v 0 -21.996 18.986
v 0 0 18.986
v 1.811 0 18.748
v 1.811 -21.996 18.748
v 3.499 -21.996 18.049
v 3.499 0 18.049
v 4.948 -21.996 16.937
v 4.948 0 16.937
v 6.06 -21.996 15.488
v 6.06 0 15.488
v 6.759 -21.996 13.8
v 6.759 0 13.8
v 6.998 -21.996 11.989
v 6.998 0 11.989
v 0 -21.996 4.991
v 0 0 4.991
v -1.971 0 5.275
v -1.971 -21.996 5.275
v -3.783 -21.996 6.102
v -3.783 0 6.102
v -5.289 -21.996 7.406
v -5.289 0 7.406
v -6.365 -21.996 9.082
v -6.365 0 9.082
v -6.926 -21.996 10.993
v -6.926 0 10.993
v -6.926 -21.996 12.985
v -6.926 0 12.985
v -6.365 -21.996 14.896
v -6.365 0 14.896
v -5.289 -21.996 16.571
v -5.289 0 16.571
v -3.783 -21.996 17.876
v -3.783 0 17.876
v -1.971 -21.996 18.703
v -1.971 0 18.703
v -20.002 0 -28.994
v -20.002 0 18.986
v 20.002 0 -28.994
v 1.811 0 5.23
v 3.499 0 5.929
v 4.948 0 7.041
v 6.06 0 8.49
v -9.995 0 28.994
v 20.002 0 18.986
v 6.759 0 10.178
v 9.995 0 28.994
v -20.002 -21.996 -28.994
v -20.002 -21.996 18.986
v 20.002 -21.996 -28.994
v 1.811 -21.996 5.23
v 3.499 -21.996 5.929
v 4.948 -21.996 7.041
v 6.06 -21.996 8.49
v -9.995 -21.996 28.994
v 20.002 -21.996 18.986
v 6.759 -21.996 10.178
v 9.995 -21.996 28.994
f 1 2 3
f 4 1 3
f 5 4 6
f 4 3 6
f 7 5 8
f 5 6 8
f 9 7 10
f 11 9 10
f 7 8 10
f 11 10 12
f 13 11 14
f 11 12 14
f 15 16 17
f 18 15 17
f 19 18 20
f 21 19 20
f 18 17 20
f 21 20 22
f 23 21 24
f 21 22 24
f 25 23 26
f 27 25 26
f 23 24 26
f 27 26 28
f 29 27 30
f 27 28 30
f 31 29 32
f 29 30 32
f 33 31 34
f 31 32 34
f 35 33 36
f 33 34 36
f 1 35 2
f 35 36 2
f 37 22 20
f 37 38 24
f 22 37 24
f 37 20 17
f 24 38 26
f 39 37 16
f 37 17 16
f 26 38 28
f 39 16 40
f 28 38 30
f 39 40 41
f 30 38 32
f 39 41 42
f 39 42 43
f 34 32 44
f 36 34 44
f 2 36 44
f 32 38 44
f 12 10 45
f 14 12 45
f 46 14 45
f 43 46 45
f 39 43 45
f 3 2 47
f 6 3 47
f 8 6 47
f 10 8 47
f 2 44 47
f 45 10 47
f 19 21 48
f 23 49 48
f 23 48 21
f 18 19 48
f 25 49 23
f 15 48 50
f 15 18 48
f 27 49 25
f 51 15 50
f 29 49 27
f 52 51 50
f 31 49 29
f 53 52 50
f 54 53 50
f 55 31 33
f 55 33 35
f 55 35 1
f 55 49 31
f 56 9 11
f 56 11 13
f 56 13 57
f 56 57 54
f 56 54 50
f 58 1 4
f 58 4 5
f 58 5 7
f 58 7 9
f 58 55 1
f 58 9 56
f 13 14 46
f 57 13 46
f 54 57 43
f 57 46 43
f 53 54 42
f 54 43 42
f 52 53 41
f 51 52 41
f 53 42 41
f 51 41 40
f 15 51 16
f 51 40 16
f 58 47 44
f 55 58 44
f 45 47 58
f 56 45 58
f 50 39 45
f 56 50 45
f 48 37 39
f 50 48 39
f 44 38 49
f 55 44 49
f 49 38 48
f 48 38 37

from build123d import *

# Parameters (mm, degrees)
F0_W     = 20.0025
F0_H     = 28.9941
F1_DEPTH = 21.9964
F2_SIZE  = 10.0076


with BuildPart() as f1:
    # F0 (on Front) → F1 (new body)
    with BuildSketch(Plane.XZ):
        with Locations((10.00125, -14.49705)):
            Rectangle(F0_W, F0_H)
        with BuildLine():
            Line((0, 4.9911), (0, 0))
            Line((0, 0), (20.0025, 0))
            Line((20.0025, 0), (20.0025, 28.9941))
            Line((20.0025, 28.9941), (0, 28.9941))
            Line((0, 28.9941), (0, 18.9865))
            ThreePointArc((0, 18.9865), (4.948121, 16.936921), (6.9977, 11.9888))
            ThreePointArc((6.9977, 11.9888), (4.948121, 7.040679), (0, 4.9911))
        make_face()
        with BuildLine():
            Line((-20.0025, 0), (0, 0))
            Line((0, 0), (0, 4.9911))
            ThreePointArc((0, 4.9911), (-6.9977, 11.9888), (0, 18.9865))
            Line((0, 18.9865), (0, 28.9941))
            Line((0, 28.9941), (-20.0025, 28.9941))
            Line((-20.0025, 28.9941), (-20.0025, 0))
        make_face()
        with Locations((-10.00125, -14.49705)):
            Rectangle(F0_W, F0_H)
    extrude(amount=F1_DEPTH)

    # F2
    f2_edges = [f1.edges().sort_by_distance(p)[0] for p in [
        (20.0025, -10.9982, 28.9941),
        (-20.0025, -10.9982, 28.9941),
    ]]
    chamfer(f2_edges, length=F2_SIZE)


solid = f1.part
